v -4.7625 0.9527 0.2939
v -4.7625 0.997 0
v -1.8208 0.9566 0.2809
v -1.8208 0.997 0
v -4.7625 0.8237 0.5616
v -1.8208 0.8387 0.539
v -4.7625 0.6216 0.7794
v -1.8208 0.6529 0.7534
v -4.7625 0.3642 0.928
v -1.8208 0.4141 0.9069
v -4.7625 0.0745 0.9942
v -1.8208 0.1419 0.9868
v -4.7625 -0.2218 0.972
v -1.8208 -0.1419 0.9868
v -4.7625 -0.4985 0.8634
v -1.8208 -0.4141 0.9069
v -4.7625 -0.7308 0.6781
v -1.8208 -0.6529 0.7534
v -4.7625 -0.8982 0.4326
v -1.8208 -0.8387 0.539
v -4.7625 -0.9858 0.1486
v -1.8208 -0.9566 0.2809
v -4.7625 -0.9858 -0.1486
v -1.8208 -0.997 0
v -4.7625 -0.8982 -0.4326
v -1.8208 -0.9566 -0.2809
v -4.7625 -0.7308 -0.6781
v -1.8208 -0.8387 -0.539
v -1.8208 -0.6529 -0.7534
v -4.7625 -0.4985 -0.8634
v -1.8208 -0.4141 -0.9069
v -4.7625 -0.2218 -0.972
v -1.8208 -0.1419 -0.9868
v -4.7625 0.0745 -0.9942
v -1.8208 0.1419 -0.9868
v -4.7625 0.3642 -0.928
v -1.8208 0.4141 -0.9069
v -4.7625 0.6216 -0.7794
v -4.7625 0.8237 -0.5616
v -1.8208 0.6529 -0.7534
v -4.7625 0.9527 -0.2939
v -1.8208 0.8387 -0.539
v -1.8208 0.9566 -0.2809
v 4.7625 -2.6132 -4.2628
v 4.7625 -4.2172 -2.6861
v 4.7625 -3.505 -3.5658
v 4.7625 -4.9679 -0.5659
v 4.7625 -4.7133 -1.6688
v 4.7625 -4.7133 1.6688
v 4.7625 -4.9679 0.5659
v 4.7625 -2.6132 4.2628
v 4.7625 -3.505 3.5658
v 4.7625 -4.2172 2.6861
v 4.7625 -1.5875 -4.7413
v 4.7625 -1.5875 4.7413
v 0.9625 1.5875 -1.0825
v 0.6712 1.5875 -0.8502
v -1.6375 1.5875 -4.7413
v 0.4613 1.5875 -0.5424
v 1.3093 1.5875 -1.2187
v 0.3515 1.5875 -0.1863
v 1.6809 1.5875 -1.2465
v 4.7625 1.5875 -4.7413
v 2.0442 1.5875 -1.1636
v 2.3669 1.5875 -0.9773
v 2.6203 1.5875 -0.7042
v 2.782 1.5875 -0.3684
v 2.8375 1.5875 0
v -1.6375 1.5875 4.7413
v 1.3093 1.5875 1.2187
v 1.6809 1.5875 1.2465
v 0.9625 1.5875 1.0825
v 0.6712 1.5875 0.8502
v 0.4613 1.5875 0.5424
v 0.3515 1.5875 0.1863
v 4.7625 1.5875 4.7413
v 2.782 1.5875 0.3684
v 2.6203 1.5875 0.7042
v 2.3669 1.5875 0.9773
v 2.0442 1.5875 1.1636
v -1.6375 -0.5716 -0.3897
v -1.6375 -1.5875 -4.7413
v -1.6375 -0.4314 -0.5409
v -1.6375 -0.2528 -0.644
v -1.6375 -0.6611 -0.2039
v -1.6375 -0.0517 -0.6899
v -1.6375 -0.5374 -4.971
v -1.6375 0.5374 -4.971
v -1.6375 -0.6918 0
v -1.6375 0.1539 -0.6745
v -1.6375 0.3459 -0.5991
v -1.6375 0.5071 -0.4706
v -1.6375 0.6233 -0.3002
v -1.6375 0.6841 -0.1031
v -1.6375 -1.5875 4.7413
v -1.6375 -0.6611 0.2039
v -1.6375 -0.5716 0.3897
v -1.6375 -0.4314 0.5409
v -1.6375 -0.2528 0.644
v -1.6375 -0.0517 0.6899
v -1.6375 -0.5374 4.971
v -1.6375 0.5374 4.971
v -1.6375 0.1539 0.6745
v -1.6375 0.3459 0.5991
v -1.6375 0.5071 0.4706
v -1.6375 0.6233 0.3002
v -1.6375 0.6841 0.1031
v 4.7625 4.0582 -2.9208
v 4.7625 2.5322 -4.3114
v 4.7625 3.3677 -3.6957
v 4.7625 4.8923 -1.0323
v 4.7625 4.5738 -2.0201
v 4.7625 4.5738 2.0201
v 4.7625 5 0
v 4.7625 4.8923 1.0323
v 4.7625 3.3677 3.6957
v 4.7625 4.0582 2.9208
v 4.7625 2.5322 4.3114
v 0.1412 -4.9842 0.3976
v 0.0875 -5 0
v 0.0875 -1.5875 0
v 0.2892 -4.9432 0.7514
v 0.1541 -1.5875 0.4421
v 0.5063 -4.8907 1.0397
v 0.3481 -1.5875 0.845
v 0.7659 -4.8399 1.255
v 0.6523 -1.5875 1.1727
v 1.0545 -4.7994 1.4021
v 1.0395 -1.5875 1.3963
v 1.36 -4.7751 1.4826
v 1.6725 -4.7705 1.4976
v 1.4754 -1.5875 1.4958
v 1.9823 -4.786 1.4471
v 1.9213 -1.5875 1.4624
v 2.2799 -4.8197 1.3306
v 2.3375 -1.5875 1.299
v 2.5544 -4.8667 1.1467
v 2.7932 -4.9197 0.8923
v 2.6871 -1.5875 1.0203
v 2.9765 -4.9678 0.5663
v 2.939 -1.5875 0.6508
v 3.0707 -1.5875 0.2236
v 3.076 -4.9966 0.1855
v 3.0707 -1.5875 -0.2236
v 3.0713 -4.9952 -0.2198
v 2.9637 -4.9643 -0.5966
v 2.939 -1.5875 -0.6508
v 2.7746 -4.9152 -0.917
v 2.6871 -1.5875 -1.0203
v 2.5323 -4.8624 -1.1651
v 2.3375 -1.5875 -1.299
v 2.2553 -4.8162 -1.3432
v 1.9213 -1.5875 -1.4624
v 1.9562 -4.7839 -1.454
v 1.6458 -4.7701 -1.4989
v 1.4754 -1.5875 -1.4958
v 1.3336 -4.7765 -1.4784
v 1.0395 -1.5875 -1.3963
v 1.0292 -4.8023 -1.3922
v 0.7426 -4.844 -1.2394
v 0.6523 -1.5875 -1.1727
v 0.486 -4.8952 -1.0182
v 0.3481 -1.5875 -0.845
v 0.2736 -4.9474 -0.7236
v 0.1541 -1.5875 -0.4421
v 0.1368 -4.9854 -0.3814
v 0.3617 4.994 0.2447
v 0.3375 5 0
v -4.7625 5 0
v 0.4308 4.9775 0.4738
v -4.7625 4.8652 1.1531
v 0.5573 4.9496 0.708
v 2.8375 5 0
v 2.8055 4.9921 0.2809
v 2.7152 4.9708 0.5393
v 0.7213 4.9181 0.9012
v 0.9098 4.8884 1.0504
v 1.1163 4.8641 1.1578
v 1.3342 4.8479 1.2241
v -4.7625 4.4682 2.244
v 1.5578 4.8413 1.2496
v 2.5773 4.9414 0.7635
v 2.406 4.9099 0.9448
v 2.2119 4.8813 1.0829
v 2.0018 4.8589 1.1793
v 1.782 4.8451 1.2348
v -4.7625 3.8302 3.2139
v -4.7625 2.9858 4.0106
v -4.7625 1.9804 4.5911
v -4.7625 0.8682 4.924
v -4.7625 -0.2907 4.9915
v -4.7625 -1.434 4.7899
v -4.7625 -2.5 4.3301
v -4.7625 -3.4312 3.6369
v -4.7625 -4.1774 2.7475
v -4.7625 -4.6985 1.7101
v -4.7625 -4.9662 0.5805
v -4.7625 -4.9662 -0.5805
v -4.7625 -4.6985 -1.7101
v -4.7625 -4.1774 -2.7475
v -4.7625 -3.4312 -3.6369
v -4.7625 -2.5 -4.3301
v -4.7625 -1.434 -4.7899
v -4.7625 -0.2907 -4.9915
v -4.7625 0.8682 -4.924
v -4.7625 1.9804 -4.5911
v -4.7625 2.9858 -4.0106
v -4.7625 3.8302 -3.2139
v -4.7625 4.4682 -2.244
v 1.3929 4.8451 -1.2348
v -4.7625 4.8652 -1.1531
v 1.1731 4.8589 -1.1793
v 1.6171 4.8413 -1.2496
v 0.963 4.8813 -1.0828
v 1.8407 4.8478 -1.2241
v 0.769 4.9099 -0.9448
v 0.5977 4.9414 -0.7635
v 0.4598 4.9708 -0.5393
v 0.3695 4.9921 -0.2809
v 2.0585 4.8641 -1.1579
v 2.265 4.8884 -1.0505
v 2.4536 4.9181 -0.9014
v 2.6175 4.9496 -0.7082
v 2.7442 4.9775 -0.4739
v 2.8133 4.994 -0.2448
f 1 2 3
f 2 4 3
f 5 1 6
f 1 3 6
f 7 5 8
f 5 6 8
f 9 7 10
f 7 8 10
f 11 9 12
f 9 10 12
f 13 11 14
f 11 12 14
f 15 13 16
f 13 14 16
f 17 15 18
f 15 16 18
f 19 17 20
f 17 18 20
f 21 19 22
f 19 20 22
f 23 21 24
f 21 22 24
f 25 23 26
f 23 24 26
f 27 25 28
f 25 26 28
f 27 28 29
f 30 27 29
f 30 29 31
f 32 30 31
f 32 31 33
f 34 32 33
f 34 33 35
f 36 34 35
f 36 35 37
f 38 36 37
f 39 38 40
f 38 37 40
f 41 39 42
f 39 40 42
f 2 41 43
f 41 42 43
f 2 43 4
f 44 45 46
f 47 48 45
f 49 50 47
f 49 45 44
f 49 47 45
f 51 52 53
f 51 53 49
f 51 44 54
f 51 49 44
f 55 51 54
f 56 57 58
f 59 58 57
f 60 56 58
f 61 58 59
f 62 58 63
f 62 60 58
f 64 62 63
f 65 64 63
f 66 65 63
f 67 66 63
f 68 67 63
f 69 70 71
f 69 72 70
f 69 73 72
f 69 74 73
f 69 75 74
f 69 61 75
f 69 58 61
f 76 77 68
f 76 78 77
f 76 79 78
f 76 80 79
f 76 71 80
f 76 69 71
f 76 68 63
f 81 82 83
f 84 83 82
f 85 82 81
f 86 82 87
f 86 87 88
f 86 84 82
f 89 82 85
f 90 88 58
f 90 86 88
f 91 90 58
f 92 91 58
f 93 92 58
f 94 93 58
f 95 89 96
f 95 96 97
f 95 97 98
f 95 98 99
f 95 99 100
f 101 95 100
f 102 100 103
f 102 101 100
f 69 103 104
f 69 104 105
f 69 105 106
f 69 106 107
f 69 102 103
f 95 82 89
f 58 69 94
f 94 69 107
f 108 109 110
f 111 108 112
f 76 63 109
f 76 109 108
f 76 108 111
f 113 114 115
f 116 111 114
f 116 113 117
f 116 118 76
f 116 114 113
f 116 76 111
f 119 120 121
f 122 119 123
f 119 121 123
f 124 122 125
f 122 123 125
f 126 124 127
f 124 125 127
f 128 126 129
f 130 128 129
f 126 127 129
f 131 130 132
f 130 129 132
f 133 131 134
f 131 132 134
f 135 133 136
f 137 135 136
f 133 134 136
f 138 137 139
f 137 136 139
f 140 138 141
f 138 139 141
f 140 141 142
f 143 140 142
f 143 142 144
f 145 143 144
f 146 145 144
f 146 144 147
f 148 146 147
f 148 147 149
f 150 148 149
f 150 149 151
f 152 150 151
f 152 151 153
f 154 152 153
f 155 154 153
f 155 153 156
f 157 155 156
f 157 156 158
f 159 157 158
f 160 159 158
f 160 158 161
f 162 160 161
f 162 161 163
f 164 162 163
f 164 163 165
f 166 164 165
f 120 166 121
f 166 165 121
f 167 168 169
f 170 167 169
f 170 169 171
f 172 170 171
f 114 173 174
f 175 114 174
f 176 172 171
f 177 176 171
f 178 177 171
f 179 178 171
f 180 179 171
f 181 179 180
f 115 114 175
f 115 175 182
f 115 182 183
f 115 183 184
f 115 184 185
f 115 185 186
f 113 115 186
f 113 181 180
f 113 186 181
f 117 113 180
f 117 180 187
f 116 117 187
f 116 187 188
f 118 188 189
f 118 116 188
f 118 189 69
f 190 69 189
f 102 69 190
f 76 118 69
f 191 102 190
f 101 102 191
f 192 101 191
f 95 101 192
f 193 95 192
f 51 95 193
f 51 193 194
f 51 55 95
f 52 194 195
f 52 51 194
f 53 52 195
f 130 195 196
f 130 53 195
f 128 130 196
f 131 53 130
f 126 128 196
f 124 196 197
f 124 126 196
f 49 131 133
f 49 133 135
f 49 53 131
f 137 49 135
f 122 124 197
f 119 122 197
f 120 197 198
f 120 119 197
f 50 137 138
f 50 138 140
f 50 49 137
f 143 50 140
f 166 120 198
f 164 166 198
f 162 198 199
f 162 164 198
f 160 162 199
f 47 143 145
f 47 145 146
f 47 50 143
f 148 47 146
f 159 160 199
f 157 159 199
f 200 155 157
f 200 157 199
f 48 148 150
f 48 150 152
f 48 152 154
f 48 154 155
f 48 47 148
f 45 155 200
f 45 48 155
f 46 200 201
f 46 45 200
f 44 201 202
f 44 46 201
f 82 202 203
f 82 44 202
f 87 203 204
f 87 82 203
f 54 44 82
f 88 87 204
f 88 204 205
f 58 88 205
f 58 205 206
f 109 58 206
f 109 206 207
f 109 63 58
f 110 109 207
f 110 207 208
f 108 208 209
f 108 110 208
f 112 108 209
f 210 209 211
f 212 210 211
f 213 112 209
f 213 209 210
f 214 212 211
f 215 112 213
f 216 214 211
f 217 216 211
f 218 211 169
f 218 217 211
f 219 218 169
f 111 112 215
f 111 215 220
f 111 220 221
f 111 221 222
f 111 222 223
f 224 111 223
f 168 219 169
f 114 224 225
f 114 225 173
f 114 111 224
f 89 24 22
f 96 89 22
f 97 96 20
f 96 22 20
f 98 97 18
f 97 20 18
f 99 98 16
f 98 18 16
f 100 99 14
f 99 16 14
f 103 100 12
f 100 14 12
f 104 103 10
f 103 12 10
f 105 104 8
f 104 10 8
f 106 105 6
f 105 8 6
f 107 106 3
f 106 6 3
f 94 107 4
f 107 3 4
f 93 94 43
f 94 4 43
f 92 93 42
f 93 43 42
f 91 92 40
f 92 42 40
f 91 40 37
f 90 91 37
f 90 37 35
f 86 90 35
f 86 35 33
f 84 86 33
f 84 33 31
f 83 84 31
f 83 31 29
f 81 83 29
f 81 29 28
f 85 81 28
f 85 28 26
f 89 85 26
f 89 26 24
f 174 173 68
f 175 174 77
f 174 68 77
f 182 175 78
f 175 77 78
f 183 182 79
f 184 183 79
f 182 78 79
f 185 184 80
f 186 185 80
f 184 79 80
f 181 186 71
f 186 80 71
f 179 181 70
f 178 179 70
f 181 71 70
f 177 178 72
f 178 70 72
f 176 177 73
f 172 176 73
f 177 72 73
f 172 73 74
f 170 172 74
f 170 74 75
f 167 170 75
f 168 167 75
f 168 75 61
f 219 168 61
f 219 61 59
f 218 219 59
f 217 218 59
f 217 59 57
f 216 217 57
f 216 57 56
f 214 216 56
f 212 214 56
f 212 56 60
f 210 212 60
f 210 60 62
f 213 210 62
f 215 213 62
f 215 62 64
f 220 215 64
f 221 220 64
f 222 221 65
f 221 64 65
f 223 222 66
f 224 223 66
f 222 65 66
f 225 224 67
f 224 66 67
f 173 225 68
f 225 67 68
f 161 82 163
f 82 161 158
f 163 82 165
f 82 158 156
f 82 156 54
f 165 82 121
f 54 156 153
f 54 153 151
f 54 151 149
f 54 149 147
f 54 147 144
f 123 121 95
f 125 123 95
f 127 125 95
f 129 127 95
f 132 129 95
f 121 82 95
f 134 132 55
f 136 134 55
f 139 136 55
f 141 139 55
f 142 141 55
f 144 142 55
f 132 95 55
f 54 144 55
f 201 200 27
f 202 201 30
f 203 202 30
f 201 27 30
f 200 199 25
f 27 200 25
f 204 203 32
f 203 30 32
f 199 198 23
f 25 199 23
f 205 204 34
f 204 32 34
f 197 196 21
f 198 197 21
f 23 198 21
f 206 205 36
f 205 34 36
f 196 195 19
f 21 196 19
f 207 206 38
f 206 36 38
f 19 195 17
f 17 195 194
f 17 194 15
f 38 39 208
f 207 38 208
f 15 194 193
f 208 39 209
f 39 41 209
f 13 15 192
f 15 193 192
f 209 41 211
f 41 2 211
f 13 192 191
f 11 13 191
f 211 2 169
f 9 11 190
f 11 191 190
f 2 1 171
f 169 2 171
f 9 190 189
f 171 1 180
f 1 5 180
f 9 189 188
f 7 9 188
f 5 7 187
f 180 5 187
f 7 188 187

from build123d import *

# Parameters (mm, degrees)
F0_R     = 5
F1_DEPTH = 4.7625
F3_D     = 1.9939
F3_DEPTH = 2.9416666667
F3_TIP   = 0.5990279941
F4_W     = 12.8
F4_H     = 3.175
F5_DEPTH = 12.5
F7_D     = 2.5
F7_DEPTH = 3.4135
F8_R     = 1.5
F9_DEPTH = 3.4135001


with BuildPart() as f1:
    # F0 (on Right) → F1 (new body, symmetric)
    with BuildSketch(Plane.YZ):
        Circle(F0_R)
    extrude(amount=F1_DEPTH, both=True)

    # F3
    with Locations(Plane(origin=(-4.7625, 0, 0), x_dir=(0, -1, 0), z_dir=(-1, 0, 0))):
        with Locations((0, 0)):
            Hole(F3_D / 2, depth=F3_DEPTH)
            with Locations((0, 0, -(F3_DEPTH + F3_TIP / 2))):  # 118° drill point
                Cone(0, F3_D / 2, F3_TIP, mode=Mode.SUBTRACT)

    # F4 (on Top) → F5 (cut, symmetric)
    with BuildSketch(Plane.XY):
        with Locations((4.7625, 0)):
            Rectangle(F4_W, F4_H)
    extrude(amount=F5_DEPTH, both=True, mode=Mode.SUBTRACT)

    # F7 (through all, one way)
    with BuildSketch(Plane.XZ.offset(-1.5875)):
        with Locations((1.5875, 0)):
            Circle(F7_D / 2)
    extrude(amount=-F7_DEPTH, mode=Mode.SUBTRACT)

    # F8 (on face) → F9 (cut, through all)
    with BuildSketch(Plane(origin=(0, -1.5875, 0), x_dir=(-1, 0, 0), z_dir=(0, 1, 0))):
        with Locations((-1.5875, 0)):
            Circle(F8_R)
    extrude(amount=-F9_DEPTH, mode=Mode.SUBTRACT)


solid = f1.part
